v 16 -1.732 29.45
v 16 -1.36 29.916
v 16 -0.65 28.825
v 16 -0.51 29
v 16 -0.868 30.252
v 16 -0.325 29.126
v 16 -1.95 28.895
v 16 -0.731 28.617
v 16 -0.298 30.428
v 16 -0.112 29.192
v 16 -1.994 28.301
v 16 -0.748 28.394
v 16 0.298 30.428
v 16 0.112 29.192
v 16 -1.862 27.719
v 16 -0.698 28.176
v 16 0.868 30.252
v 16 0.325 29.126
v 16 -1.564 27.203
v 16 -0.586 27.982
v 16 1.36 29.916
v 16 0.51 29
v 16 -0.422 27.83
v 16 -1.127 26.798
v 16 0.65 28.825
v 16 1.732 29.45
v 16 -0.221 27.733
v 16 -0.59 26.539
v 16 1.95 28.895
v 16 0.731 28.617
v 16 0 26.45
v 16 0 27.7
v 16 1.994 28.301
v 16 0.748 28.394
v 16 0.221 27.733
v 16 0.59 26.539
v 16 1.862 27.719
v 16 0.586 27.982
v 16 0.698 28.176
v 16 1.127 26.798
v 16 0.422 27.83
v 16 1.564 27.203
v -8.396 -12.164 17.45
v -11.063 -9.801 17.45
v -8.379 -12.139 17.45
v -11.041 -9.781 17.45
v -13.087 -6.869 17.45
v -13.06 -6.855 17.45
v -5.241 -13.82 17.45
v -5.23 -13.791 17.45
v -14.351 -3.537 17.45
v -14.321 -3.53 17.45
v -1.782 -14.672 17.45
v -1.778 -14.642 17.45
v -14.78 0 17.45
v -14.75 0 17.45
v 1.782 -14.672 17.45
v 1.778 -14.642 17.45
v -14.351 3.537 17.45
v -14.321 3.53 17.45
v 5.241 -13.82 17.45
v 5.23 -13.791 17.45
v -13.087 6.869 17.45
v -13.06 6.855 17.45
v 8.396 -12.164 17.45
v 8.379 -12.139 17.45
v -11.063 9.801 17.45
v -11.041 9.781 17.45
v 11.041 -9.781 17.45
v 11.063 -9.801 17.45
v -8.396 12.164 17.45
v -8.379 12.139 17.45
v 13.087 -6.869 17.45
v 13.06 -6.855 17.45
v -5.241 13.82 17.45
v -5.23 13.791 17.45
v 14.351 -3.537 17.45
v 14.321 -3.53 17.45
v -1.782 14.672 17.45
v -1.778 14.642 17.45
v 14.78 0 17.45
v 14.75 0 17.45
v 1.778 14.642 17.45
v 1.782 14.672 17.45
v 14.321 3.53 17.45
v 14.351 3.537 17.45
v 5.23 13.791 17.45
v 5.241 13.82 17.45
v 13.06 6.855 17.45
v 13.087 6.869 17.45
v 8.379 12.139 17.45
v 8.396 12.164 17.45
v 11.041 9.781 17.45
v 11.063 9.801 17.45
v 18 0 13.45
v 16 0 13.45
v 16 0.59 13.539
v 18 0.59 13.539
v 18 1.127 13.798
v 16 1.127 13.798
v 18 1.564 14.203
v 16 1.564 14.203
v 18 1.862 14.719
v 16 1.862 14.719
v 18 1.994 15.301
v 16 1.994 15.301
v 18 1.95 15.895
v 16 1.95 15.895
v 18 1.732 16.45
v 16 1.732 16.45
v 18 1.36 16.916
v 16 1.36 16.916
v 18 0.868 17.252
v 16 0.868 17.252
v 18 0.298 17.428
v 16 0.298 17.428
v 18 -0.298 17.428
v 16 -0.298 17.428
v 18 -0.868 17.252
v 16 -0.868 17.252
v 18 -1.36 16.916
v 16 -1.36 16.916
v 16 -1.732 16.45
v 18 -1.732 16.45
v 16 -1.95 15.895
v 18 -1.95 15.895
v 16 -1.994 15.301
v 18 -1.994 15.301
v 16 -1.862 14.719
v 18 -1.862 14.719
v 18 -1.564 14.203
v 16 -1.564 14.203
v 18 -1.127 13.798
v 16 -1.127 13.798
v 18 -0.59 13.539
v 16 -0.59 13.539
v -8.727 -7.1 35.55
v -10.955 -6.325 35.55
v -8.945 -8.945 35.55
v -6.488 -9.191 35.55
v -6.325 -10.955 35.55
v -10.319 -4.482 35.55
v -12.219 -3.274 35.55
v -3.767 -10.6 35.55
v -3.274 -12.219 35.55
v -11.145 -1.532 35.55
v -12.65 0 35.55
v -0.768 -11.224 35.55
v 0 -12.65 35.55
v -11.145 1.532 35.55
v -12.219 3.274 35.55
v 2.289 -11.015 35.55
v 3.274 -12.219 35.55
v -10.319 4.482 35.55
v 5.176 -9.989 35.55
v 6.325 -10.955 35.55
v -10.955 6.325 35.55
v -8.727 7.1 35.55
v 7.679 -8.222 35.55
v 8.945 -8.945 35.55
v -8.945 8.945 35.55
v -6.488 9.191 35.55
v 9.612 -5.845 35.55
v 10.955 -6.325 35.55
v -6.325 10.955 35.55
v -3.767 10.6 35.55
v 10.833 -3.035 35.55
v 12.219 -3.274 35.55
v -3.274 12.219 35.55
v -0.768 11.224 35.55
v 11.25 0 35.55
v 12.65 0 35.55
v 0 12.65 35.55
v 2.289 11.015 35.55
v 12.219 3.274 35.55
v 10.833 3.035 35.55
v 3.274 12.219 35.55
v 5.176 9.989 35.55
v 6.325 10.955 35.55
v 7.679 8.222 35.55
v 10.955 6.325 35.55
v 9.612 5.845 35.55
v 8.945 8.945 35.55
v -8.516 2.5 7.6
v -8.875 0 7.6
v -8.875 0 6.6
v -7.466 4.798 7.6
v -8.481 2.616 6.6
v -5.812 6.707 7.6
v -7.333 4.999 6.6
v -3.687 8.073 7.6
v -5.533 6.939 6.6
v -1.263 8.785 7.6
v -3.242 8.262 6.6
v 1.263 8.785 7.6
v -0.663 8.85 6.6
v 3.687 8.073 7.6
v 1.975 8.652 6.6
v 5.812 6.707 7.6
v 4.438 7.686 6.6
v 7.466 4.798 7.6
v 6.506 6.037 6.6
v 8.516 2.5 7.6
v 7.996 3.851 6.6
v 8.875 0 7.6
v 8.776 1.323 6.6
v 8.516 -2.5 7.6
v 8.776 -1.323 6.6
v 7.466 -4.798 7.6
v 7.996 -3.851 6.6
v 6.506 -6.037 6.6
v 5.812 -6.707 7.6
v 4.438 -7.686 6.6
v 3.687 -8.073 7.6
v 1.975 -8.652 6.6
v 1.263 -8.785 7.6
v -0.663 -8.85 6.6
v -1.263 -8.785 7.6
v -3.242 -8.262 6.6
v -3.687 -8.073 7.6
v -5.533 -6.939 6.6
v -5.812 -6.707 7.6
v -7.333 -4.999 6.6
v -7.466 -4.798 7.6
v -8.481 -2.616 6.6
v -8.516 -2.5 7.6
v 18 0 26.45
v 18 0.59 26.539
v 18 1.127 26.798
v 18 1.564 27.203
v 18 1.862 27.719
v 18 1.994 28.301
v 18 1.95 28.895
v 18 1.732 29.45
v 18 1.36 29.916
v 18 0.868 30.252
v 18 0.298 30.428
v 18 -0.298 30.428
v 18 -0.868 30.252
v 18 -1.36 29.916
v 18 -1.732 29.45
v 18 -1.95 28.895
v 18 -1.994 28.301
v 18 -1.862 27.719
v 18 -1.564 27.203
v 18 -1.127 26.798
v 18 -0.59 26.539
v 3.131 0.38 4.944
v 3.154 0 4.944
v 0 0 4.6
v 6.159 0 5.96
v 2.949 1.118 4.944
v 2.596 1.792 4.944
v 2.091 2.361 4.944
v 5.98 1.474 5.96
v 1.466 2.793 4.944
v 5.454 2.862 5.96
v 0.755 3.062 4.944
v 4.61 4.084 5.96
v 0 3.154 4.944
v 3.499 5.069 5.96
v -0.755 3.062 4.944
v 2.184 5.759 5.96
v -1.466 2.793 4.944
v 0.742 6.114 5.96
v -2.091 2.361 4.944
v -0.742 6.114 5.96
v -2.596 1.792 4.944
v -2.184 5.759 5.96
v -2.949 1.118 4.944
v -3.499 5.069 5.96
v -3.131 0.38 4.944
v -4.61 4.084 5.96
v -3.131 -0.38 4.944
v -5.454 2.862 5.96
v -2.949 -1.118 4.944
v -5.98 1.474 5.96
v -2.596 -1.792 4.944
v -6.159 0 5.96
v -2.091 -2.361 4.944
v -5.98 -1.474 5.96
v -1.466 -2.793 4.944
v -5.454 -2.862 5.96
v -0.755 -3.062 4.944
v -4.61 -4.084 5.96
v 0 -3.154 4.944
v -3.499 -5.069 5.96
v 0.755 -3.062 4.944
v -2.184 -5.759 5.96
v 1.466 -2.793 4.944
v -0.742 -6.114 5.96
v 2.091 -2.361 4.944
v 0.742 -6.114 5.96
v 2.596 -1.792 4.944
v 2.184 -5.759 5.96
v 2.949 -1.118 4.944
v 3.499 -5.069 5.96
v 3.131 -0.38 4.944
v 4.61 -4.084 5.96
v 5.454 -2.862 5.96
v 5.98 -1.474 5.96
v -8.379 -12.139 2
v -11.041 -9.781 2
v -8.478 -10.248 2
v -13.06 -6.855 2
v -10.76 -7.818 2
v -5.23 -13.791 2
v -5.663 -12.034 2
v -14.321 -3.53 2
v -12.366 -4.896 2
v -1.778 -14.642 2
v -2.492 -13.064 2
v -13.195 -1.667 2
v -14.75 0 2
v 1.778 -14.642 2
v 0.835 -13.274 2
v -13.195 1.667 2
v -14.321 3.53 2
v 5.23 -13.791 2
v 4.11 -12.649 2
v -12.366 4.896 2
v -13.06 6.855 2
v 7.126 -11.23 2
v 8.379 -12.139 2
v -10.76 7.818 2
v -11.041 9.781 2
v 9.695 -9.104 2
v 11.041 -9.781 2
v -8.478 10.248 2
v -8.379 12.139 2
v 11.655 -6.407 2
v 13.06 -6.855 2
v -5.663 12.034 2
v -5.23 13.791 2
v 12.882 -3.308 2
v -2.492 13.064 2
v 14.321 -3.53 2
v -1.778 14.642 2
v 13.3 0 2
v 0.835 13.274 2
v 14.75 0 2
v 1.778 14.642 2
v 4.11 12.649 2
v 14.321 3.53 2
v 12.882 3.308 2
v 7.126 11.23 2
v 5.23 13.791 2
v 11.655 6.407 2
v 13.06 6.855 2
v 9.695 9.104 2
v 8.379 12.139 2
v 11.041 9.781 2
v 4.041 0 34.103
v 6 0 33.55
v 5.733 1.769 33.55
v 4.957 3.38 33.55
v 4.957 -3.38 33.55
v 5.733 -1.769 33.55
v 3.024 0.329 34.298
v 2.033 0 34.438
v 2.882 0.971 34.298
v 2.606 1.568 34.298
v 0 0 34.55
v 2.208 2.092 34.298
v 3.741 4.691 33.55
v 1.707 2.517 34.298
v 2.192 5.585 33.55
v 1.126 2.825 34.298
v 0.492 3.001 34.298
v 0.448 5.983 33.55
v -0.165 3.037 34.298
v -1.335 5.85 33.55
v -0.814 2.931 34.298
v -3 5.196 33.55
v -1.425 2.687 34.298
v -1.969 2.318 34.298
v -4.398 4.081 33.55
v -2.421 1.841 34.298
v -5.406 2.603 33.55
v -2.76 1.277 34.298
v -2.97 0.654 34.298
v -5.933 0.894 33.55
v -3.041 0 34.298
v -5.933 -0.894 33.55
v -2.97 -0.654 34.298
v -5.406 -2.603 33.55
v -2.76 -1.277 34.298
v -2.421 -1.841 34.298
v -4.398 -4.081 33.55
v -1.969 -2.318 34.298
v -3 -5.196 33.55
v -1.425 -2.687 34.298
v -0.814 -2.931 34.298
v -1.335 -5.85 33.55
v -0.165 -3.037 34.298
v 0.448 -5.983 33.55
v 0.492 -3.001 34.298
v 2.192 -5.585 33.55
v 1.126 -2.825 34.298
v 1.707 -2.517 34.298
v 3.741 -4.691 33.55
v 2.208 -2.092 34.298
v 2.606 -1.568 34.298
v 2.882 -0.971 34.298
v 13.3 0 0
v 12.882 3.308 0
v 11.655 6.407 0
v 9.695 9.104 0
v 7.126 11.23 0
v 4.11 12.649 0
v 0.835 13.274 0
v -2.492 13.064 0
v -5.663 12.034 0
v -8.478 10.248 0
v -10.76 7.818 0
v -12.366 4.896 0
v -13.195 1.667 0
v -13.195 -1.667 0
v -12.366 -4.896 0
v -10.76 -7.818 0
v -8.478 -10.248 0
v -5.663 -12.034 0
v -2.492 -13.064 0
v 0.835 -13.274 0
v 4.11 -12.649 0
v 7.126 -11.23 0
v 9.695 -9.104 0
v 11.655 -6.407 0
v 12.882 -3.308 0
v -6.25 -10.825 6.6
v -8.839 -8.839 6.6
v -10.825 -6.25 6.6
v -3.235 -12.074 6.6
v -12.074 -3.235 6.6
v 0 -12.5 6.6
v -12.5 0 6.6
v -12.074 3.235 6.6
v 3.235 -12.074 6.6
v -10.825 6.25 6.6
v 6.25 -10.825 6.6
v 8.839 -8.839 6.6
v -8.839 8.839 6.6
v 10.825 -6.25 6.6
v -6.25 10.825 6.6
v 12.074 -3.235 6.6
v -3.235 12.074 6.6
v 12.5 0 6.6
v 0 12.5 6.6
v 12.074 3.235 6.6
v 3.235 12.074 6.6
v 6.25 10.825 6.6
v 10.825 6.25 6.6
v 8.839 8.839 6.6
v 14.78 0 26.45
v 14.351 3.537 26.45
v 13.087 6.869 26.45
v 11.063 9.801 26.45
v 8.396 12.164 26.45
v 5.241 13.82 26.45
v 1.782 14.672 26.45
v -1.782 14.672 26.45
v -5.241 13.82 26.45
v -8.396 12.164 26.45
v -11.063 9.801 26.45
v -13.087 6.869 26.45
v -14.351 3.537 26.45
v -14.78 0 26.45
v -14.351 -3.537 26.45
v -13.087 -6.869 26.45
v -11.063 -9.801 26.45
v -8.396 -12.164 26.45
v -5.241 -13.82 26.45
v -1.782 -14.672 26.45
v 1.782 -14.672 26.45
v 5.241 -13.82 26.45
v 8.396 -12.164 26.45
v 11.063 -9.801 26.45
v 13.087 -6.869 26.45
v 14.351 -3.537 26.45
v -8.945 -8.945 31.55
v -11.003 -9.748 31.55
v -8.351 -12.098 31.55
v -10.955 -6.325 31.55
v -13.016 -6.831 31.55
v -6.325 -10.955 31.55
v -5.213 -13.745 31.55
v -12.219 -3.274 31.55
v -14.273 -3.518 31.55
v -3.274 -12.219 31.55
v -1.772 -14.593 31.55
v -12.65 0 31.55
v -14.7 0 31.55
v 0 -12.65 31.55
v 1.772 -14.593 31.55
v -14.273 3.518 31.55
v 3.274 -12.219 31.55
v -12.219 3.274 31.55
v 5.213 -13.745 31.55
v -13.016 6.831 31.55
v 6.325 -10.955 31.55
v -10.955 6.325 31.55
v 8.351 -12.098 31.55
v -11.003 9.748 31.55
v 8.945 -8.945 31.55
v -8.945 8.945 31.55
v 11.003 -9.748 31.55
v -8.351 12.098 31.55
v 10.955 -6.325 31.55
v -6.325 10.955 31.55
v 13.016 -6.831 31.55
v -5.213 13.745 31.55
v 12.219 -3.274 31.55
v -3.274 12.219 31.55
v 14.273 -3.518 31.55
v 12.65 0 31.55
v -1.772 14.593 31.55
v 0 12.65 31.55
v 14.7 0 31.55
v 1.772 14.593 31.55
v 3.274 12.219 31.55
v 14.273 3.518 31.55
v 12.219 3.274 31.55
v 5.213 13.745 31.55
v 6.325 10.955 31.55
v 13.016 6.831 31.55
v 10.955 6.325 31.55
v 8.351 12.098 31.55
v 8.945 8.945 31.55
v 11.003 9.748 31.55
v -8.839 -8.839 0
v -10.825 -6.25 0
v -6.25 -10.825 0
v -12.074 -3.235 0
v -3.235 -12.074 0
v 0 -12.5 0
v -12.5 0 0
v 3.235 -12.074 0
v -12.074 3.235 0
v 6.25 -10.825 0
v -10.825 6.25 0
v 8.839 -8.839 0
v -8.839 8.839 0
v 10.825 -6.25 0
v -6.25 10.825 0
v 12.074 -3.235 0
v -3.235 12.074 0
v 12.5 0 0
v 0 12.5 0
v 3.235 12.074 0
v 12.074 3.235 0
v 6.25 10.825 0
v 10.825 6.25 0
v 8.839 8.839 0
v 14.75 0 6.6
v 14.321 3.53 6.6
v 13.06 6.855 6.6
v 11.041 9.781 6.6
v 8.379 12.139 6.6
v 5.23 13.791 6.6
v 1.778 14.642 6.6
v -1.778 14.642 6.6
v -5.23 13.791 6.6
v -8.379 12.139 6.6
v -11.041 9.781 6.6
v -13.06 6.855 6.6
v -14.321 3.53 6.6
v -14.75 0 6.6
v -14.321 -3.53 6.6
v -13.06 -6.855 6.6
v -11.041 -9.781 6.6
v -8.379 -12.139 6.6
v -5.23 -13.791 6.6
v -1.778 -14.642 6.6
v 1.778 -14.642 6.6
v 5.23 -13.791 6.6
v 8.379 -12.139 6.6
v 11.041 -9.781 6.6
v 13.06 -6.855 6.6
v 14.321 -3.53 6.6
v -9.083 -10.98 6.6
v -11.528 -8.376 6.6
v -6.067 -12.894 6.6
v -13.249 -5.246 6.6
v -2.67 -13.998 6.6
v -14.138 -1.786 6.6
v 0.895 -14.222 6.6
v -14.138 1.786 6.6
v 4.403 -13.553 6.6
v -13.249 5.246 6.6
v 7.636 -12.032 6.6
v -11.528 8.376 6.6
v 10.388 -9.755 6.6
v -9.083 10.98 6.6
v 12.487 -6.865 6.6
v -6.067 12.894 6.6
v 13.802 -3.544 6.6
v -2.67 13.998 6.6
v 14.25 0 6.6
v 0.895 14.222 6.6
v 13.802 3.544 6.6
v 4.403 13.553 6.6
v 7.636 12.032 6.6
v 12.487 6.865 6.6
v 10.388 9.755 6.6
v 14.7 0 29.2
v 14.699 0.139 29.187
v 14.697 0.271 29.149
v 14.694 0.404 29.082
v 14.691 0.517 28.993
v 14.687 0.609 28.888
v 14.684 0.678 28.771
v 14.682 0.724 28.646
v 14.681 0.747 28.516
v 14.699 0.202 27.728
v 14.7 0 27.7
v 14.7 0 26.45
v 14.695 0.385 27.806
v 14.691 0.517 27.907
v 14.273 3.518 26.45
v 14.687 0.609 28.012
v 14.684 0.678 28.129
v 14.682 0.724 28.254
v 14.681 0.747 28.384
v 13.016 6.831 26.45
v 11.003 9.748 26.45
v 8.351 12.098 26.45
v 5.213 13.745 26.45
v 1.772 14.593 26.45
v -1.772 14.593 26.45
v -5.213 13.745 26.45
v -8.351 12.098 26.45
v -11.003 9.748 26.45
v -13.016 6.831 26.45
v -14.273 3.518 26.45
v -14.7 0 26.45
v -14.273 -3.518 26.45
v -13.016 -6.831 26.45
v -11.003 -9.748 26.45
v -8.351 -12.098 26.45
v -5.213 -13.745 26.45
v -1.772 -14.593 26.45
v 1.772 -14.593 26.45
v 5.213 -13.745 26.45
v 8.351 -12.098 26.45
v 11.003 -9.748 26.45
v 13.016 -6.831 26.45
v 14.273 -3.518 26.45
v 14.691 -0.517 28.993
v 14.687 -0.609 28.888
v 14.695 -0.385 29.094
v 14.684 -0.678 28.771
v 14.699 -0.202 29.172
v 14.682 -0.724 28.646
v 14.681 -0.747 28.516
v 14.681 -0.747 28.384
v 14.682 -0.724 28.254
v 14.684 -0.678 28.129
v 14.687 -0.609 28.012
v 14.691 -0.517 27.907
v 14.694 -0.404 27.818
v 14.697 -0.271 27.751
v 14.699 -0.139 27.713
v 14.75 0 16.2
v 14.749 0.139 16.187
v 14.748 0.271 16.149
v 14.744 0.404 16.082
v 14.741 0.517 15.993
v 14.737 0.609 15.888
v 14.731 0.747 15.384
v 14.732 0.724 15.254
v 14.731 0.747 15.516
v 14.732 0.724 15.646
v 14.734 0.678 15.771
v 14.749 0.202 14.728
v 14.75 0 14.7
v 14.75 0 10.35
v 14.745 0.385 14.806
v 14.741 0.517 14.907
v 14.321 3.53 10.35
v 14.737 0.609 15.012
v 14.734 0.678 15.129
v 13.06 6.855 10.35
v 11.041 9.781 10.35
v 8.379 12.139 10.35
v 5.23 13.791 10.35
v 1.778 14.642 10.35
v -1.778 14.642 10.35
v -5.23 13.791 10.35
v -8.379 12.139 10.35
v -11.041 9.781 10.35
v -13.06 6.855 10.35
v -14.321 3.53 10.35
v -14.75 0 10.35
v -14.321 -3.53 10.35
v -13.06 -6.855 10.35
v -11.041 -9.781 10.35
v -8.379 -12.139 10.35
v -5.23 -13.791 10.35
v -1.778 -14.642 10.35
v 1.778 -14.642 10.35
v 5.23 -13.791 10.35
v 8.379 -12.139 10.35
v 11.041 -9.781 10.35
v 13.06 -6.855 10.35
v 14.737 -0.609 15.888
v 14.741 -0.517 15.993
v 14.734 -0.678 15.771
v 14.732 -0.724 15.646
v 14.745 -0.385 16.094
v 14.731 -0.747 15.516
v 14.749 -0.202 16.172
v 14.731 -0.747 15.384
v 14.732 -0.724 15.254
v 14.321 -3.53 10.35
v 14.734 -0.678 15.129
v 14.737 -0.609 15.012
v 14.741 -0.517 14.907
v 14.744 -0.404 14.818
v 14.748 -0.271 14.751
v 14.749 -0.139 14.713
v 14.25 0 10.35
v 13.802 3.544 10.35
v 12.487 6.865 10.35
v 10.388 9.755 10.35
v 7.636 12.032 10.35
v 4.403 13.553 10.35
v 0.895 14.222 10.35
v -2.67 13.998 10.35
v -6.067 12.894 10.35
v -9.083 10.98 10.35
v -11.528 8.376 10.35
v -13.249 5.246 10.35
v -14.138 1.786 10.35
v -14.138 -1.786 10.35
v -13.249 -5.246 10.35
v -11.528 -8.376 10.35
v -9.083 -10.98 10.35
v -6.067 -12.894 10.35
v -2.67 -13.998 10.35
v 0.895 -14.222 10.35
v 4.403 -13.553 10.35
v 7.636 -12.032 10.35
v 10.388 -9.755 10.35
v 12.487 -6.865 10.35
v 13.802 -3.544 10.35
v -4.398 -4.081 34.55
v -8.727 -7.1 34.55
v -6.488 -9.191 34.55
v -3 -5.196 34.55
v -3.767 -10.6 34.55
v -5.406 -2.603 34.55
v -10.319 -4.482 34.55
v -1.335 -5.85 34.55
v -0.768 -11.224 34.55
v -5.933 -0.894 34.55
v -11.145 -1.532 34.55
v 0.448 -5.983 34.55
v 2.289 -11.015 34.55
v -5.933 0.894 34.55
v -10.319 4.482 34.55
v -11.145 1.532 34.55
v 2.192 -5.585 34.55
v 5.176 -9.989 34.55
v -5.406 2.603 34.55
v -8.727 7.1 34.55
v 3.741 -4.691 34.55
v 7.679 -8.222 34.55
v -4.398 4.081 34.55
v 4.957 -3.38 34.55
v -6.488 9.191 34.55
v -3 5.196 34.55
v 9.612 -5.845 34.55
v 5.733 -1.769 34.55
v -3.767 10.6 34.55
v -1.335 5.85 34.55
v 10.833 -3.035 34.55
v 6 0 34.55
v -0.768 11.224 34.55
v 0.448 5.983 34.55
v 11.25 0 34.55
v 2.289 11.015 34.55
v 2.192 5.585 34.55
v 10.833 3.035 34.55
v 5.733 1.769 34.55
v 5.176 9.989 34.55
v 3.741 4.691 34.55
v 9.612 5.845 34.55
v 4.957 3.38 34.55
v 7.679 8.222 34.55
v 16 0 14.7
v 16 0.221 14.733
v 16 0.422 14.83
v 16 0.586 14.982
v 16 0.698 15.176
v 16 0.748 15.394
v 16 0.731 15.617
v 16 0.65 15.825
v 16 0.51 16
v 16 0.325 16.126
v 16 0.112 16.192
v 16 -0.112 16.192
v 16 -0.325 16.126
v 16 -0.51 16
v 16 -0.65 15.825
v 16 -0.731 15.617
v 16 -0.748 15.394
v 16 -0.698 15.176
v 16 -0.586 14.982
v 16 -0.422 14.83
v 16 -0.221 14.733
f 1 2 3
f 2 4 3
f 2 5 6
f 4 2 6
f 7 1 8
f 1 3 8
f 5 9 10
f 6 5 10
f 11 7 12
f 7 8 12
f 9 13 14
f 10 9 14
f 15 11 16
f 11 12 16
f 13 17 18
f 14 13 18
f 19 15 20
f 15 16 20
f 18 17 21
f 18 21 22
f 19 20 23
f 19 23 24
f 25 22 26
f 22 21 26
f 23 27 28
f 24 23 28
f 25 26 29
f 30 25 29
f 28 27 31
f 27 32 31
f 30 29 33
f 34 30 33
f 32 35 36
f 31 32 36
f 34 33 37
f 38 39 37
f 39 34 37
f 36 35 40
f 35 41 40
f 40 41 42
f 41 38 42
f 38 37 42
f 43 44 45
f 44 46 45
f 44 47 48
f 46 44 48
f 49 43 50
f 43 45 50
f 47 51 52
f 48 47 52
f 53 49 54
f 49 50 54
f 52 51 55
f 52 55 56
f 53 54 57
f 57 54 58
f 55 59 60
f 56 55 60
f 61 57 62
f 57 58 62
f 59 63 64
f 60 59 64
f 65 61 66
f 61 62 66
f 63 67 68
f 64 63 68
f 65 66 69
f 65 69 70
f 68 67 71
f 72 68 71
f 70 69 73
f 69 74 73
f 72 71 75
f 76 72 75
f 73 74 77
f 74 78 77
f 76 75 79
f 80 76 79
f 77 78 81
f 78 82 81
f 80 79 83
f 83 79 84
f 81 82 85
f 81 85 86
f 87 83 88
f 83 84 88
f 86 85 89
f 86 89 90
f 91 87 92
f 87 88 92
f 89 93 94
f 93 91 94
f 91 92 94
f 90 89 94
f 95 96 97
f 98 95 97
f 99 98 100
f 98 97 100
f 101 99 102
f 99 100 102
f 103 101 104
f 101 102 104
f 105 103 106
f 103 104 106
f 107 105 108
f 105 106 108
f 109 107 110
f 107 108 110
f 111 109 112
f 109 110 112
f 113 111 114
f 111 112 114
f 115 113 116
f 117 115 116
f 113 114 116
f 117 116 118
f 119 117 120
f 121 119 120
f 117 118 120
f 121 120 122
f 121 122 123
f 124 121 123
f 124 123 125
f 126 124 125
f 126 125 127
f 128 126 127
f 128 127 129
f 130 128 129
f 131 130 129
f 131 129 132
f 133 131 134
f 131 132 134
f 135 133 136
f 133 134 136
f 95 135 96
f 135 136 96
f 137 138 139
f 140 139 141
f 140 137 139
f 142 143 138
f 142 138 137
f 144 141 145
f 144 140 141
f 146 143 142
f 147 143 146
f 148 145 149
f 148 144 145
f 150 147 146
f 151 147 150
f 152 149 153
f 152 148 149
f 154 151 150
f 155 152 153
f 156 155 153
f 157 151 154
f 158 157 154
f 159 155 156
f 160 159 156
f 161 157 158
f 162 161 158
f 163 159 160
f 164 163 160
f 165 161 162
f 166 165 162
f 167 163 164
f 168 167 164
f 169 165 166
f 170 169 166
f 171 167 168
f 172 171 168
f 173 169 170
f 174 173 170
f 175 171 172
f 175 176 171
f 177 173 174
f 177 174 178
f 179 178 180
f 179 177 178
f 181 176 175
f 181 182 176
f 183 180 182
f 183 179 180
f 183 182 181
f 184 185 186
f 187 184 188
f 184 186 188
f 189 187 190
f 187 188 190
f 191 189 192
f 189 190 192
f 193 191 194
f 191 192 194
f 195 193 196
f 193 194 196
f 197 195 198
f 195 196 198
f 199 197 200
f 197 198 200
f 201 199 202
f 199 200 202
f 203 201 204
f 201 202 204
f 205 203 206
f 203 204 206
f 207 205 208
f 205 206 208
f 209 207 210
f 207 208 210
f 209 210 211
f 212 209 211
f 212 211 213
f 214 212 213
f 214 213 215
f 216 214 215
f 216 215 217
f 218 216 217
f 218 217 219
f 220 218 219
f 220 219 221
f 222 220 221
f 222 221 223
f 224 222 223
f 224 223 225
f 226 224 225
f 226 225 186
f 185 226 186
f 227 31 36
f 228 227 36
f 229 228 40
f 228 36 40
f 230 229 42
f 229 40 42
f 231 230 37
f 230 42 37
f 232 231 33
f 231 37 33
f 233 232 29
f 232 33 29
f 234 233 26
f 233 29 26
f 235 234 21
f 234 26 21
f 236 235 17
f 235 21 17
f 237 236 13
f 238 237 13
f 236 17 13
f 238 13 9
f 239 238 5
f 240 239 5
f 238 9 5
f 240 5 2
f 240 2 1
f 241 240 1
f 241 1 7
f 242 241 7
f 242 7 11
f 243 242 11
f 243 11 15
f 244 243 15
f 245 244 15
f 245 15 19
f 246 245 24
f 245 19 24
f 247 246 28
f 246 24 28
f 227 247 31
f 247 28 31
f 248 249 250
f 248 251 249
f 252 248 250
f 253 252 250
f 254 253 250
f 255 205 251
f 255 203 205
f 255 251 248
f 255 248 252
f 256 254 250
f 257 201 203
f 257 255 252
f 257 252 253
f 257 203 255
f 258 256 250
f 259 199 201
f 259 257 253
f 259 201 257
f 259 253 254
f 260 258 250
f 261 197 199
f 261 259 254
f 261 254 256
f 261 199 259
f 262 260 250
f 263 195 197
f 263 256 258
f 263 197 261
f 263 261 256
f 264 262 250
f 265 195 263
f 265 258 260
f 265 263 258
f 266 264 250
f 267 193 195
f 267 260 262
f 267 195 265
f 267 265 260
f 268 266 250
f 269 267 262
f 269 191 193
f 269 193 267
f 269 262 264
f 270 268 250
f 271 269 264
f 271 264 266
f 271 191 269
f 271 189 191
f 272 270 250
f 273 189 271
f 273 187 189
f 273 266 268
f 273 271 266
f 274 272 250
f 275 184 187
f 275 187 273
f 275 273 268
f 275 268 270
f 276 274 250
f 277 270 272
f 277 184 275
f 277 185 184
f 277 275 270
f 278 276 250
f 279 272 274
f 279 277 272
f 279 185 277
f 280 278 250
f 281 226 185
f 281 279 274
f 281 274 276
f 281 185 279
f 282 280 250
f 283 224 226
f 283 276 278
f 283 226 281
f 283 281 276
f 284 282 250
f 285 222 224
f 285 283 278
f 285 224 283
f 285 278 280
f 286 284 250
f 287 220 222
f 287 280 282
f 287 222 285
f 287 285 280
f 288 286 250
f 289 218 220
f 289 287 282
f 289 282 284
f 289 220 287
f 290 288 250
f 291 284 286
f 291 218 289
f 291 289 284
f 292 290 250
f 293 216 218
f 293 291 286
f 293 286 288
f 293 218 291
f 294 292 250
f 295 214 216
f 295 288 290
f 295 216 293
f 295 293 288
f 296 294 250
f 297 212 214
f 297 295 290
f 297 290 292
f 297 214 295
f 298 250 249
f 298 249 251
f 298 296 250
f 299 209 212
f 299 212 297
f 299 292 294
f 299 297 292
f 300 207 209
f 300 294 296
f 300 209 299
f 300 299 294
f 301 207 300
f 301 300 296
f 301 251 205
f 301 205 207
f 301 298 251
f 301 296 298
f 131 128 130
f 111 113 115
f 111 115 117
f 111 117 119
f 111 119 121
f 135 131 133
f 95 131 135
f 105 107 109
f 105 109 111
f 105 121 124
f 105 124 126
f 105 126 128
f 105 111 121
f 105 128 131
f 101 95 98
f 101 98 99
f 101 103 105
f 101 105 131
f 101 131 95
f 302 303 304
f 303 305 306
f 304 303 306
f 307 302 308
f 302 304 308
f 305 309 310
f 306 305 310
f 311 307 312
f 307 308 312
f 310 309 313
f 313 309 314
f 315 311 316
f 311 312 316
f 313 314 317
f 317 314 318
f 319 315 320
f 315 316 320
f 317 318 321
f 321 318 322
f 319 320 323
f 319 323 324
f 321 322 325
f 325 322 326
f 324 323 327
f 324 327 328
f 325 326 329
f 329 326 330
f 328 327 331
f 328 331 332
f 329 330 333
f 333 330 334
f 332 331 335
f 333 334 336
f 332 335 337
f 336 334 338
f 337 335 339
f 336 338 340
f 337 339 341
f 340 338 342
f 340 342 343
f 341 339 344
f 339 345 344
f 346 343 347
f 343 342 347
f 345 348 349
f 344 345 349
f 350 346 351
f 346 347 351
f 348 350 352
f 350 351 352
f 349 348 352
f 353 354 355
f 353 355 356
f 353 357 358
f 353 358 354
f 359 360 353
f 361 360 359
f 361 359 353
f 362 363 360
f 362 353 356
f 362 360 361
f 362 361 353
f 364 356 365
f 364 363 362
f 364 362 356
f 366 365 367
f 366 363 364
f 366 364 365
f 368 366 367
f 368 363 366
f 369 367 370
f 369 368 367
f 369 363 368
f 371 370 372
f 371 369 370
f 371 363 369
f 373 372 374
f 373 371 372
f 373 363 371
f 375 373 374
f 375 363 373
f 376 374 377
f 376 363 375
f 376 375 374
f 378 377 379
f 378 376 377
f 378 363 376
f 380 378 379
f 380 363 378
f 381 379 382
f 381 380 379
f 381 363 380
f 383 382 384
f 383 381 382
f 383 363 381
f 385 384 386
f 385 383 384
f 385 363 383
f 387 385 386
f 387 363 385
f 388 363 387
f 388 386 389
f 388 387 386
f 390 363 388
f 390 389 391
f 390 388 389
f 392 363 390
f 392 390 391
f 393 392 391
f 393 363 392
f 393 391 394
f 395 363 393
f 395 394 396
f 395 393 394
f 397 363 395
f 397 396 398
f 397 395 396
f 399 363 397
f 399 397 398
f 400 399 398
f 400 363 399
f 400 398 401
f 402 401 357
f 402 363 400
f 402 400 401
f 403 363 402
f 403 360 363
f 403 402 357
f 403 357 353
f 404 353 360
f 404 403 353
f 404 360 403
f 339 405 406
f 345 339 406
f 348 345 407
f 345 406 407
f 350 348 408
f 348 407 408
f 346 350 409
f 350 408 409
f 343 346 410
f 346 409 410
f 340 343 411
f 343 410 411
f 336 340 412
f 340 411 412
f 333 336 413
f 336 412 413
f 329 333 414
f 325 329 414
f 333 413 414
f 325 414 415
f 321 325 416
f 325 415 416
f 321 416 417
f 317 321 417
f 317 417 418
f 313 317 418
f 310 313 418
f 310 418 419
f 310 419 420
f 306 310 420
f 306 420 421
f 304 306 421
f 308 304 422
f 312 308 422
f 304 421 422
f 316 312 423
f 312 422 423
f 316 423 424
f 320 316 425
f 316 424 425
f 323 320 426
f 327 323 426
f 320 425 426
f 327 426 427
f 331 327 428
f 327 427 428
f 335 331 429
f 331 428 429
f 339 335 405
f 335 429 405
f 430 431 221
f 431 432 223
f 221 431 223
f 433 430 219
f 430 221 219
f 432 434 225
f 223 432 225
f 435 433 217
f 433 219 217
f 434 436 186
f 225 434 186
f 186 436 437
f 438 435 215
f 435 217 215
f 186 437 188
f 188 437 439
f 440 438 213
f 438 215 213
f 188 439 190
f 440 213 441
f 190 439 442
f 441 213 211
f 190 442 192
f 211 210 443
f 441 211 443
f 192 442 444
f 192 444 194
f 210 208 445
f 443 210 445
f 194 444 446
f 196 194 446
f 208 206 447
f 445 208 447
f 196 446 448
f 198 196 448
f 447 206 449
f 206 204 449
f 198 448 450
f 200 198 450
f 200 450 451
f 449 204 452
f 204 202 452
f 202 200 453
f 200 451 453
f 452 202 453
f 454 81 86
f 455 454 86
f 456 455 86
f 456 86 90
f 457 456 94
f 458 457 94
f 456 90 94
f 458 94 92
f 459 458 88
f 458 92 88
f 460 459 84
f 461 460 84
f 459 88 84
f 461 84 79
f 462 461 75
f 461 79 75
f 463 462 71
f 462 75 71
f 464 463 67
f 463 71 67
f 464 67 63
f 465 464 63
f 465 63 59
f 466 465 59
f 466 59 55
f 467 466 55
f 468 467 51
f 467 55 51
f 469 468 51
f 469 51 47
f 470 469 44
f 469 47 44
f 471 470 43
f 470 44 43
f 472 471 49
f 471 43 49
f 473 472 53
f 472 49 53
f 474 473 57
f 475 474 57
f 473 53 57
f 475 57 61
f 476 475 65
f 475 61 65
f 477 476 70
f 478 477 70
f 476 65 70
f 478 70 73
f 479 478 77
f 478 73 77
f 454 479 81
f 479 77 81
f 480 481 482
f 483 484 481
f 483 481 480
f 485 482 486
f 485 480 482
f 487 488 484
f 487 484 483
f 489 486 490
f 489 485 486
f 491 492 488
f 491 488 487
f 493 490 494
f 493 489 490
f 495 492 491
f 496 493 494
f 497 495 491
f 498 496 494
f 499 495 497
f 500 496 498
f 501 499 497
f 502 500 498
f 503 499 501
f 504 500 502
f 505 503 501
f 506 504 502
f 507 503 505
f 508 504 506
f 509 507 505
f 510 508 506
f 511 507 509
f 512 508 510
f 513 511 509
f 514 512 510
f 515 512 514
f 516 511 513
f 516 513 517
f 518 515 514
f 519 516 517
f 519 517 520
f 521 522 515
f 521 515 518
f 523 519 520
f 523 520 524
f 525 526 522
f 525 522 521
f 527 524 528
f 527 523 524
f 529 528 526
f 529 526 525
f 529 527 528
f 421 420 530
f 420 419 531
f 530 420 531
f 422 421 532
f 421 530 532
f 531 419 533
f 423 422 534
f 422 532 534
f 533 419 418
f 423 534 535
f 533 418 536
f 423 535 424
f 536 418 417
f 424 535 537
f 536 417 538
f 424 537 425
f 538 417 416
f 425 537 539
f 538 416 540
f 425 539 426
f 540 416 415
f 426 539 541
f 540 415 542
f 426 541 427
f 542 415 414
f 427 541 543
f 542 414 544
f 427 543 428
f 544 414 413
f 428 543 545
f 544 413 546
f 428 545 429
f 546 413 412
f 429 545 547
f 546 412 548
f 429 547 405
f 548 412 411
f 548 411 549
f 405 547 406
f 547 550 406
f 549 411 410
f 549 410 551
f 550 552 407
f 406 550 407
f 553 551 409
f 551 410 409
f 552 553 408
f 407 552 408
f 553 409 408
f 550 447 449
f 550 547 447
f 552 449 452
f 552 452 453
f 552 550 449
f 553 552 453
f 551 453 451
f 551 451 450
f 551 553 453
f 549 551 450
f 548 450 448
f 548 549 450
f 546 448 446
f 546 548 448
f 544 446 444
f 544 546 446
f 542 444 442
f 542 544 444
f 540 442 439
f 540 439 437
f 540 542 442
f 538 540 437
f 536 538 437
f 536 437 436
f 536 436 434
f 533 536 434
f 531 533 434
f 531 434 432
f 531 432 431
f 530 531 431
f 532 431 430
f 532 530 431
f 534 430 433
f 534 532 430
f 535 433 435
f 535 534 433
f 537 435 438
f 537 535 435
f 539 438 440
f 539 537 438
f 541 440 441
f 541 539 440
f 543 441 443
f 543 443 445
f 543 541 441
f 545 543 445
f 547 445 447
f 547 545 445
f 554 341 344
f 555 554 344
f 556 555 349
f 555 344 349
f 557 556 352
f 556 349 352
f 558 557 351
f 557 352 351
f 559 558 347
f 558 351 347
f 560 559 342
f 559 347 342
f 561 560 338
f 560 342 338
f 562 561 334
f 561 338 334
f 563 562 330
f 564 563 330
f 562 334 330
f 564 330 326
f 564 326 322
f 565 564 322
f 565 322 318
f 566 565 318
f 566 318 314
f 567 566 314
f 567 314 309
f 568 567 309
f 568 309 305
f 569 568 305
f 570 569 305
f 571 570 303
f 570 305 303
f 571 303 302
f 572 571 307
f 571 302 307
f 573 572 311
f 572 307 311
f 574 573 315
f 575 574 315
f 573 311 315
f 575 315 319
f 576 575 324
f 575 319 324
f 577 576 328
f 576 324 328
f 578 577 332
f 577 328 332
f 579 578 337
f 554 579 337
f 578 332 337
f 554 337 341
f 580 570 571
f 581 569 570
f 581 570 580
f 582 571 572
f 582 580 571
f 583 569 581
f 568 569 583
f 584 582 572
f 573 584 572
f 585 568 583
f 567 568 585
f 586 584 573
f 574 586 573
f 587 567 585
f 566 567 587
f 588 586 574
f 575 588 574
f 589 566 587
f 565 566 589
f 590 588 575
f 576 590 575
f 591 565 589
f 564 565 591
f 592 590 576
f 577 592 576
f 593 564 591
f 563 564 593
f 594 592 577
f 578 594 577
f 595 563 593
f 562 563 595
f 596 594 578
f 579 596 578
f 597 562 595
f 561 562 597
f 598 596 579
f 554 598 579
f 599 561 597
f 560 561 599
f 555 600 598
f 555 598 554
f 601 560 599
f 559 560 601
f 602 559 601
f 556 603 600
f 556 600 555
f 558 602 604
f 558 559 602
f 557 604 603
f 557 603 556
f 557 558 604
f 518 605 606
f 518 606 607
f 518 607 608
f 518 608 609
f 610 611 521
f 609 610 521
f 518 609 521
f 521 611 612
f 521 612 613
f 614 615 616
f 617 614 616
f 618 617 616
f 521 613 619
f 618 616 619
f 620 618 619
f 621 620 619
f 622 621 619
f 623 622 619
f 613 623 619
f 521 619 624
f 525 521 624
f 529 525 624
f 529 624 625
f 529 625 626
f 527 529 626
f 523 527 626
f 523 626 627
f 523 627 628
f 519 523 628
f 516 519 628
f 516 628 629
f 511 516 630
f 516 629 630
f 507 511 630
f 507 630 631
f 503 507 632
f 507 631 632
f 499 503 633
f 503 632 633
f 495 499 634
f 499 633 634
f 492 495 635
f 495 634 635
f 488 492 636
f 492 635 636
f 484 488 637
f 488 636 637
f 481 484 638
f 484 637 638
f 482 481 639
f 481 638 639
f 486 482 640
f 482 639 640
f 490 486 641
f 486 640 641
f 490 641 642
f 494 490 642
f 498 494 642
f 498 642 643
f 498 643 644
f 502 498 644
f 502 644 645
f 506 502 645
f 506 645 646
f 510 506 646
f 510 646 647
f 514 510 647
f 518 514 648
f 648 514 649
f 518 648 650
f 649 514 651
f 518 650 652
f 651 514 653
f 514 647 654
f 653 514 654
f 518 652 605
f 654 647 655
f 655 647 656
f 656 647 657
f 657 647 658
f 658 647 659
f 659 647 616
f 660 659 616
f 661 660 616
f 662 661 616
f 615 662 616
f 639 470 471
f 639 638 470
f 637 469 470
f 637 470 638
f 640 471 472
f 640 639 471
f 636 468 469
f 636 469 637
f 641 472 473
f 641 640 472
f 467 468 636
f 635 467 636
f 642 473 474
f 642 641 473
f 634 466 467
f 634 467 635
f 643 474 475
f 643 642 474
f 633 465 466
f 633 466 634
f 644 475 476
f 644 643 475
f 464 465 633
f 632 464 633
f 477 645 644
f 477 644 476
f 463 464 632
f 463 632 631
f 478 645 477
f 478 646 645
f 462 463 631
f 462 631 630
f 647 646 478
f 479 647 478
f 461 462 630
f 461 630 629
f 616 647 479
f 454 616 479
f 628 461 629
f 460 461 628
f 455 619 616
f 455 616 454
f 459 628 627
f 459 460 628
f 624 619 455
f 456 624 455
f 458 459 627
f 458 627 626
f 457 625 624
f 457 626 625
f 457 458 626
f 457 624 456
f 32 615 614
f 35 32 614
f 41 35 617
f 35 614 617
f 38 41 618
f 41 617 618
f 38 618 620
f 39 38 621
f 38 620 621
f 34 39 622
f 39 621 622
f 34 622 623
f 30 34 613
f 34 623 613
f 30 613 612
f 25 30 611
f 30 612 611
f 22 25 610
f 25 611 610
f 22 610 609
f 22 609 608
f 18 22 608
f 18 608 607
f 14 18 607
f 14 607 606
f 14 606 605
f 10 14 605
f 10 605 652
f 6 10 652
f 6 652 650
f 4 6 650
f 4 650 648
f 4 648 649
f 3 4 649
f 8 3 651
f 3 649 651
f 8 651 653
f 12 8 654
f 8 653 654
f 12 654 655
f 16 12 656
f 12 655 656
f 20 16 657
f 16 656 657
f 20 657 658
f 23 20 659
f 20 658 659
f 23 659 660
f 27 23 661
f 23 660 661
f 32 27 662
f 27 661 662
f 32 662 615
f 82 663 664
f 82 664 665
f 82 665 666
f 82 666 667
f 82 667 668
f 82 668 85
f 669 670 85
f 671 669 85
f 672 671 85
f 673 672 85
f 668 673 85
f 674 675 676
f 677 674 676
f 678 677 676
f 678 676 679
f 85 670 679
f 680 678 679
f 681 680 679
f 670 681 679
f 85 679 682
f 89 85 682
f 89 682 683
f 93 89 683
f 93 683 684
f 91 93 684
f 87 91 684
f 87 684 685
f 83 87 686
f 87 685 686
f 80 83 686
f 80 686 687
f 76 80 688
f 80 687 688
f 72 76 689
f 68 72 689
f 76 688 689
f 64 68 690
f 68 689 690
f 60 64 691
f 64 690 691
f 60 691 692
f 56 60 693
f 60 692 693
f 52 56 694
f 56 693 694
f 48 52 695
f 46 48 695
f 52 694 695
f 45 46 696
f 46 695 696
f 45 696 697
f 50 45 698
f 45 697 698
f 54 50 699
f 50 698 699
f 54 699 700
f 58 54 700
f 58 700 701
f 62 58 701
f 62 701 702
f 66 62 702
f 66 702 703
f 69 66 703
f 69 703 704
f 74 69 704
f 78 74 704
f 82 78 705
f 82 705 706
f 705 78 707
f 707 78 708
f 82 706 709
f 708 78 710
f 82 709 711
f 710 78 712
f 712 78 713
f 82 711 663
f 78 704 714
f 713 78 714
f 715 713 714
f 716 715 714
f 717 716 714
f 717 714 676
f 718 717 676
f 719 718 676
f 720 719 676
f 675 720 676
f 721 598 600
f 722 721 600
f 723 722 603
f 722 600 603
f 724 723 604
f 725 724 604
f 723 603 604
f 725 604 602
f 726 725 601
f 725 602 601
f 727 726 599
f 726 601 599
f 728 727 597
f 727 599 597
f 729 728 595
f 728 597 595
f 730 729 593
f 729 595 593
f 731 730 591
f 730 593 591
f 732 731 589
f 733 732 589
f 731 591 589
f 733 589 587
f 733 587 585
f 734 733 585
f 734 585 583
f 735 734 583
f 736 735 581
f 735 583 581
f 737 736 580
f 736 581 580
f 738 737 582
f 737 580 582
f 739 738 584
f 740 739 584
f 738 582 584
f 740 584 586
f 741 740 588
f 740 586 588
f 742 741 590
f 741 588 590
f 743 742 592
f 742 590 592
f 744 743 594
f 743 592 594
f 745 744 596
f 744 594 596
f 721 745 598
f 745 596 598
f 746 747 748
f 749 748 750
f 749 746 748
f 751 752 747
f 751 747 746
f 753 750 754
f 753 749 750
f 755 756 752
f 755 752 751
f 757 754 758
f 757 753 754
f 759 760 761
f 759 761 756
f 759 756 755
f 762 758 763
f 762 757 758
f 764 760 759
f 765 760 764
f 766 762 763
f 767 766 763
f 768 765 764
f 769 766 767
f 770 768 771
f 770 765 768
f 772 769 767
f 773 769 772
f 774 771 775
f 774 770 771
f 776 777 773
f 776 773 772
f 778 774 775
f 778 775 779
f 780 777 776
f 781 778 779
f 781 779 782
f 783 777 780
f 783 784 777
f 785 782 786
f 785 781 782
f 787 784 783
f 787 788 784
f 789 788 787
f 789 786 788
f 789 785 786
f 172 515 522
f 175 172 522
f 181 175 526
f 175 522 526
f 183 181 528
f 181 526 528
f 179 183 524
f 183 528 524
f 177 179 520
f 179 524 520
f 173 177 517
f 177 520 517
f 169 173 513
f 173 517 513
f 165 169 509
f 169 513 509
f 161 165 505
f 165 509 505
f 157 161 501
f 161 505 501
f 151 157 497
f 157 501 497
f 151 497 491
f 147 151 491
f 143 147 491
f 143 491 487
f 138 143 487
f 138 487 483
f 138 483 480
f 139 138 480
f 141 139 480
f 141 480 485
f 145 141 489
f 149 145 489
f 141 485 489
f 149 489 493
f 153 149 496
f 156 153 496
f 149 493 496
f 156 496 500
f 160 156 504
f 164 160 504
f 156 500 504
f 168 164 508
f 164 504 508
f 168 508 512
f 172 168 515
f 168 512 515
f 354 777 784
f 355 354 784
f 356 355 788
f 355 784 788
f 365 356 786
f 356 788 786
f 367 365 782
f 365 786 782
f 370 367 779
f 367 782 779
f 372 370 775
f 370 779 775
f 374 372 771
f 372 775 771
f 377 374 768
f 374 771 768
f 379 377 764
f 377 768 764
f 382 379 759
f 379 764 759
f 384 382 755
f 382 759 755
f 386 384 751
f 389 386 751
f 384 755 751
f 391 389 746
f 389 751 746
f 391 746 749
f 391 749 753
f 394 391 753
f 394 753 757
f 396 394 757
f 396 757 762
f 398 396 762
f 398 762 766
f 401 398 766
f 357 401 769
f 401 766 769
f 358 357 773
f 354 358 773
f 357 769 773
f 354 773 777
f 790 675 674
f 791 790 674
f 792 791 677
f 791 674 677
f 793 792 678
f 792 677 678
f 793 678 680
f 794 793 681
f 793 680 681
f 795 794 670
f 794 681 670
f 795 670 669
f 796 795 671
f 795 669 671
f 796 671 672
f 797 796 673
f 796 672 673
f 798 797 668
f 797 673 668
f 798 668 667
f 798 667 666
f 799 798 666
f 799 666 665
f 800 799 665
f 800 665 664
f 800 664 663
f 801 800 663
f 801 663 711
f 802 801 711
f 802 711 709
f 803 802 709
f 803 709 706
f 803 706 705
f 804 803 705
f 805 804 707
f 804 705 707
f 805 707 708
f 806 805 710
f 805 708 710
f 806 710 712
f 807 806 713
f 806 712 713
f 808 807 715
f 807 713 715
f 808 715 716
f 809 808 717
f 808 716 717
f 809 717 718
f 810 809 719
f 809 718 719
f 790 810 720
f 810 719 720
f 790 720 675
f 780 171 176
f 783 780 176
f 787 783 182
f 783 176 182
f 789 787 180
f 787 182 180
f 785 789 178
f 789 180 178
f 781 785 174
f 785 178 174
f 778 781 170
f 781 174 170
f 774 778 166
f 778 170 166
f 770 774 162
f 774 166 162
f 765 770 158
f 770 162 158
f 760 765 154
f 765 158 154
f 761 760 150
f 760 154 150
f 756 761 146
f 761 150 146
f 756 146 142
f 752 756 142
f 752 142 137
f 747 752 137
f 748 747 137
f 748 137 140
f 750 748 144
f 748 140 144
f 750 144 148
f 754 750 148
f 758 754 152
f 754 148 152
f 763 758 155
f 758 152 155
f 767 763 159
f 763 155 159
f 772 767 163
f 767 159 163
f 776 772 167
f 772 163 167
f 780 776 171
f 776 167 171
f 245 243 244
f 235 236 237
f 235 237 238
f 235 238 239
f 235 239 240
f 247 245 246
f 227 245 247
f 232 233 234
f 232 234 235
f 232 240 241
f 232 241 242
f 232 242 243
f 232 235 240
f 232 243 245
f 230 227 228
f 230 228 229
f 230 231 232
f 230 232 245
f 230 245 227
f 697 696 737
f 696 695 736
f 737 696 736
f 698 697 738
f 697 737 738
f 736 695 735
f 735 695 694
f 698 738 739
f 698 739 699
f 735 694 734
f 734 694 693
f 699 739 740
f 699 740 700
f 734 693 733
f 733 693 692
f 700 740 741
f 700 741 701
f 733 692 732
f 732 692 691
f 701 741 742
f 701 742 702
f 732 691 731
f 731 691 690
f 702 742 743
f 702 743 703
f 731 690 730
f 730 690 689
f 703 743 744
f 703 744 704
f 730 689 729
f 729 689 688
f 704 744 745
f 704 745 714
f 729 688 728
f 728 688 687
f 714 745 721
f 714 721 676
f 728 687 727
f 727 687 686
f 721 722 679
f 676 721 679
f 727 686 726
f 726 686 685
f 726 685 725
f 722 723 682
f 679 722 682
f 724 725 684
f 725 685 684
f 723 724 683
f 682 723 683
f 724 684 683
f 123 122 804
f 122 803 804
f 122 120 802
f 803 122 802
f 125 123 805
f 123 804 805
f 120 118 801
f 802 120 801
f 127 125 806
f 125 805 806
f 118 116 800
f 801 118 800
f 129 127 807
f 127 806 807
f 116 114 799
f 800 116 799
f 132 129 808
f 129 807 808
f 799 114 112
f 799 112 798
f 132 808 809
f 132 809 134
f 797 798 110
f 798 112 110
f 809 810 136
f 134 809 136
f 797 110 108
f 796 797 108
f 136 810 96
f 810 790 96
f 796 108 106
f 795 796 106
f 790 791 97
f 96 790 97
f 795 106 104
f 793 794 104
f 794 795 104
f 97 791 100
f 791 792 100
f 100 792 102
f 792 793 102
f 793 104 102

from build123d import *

# Parameters (mm, degrees)
SKETCH1_R       = 13.3
SKETCH1_R_2     = 12.5
EXTRUDE1_DEPTH  = 2
SKETCH2_R       = 14.75
SKETCH2_R_2     = 12.5
EXTRUDE2_DEPTH  = 4.6
SKETCH3_R       = 14.25
EXTRUDE3_DEPTH  = 3.75
SKETCH4_R       = 14.75
EXTRUDE4_DEPTH  = 7.1
SKETCH5_R       = 14.78
EXTRUDE5_DEPTH  = 9
SKETCH6_R       = 14.7
EXTRUDE6_DEPTH  = 5.1
SKETCH7_R       = 12.65
EXTRUDE7_DEPTH  = 4
SKETCH8_R       = 11.25
EXTRUDE8_DEPTH  = 1
SKETCH9_R       = 8.875
EXTRUDE9_DEPTH  = 1
SKETCH10_R      = 6
EXTRUDE10_DEPTH = 1
SKETCH11_R      = 0.75
EXTRUDE11_DEPTH = 16
SKETCH12_R      = 2
EXTRUDE12_DEPTH = 2


# Read off the part's stored shape, not the designer's step: Dome1, Dome2
with BuildPart() as part:
    # Sketch1 → Extrude1 (new body)
    with BuildSketch(Plane.XY):
        Circle(SKETCH1_R)
        Circle(SKETCH1_R_2, mode=Mode.SUBTRACT)
    extrude(amount=EXTRUDE1_DEPTH)

    # Sketch2 → Extrude2 (add)
    with BuildSketch(Plane.XY.offset(2)):
        Circle(SKETCH2_R)
        Circle(SKETCH2_R_2, mode=Mode.SUBTRACT)
    extrude(amount=EXTRUDE2_DEPTH)

    # Sketch3 → Extrude3 (add)
    with BuildSketch(Plane.XY.offset(6.6)):
        Circle(SKETCH3_R)
    extrude(amount=EXTRUDE3_DEPTH)

    # Sketch4 → Extrude4 (add)
    with BuildSketch(Plane.XY.offset(10.35)):
        Circle(SKETCH4_R)
    extrude(amount=EXTRUDE4_DEPTH)

    # Sketch5 → Extrude5 (add)
    with BuildSketch(Plane.XY.offset(17.45)):
        Circle(SKETCH5_R)
    extrude(amount=EXTRUDE5_DEPTH)

    # Sketch6 → Extrude6 (add)
    with BuildSketch(Plane.XY.offset(26.45)):
        Circle(SKETCH6_R)
    extrude(amount=EXTRUDE6_DEPTH)

    # Sketch7 → Extrude7 (add)
    with BuildSketch(Plane.XY.offset(31.55)):
        Circle(SKETCH7_R)
    extrude(amount=EXTRUDE7_DEPTH)

    # Sketch8 → Extrude8 (cut)
    with BuildSketch(Plane.XY.offset(35.55)):
        Circle(SKETCH8_R)
    extrude(amount=-EXTRUDE8_DEPTH, mode=Mode.SUBTRACT)

    # Sketch9 → Extrude9 (cut)
    with BuildSketch(Plane(origin=(0, 0, 6.6), x_dir=(-1, 0, 0), z_dir=(0, 0, -1))):
        Circle(SKETCH9_R)
    extrude(amount=-EXTRUDE9_DEPTH, mode=Mode.SUBTRACT)

    # Dome1 outline → Dome1 (revolve)
    with BuildSketch(Plane.XZ):
        with BuildLine():
            Line((0, 7.600000009), (0, 4.6))
            ThreePointArc((0, 4.6), (4.684165488, 5.370281289), (8.875000012, 7.600000009))
            Line((8.875000012, 7.600000009), (0, 7.600000009))
        make_face()
    revolve(axis=Axis((0, 0, 0), (0, 0, 1)))

    # Sketch10 → Extrude10 (cut)
    with BuildSketch(Plane.XY.offset(34.55)):
        Circle(SKETCH10_R)
    extrude(amount=-EXTRUDE10_DEPTH, mode=Mode.SUBTRACT)

    # Dome2 outline → Dome2 (revolve)
    with BuildSketch(Plane.XZ):
        with BuildLine():
            Line((0, 33.55), (6.000000017, 33.549999994))
            ThreePointArc((6.000000017, 33.549999994), (3.041381274, 34.298287589), (0, 34.55))
            Line((0, 34.55), (0, 33.55))
        make_face()
    revolve(axis=Axis((0, 0, 0), (0, 0, 1)))

    # Sketch11 → Extrude11 (add)
    with BuildSketch(Plane(origin=(0, 0, 0), x_dir=(0, 0, -1), z_dir=(1, 0, 0))):
        with Locations((-28.45, 0)):
            Circle(SKETCH11_R)
        with Locations((-15.45, 0)):
            Circle(SKETCH11_R)
    extrude(amount=EXTRUDE11_DEPTH)

    # Sketch12 → Extrude12 (add)
    with BuildSketch(Plane(origin=(16, 0, 0), x_dir=(0, 0, -1), z_dir=(1, 0, 0))):
        with Locations((-28.45, 0)):
            Circle(SKETCH12_R)
        with Locations((-15.45, 0)):
            Circle(SKETCH12_R)
    extrude(amount=EXTRUDE12_DEPTH)


solid = part.part
